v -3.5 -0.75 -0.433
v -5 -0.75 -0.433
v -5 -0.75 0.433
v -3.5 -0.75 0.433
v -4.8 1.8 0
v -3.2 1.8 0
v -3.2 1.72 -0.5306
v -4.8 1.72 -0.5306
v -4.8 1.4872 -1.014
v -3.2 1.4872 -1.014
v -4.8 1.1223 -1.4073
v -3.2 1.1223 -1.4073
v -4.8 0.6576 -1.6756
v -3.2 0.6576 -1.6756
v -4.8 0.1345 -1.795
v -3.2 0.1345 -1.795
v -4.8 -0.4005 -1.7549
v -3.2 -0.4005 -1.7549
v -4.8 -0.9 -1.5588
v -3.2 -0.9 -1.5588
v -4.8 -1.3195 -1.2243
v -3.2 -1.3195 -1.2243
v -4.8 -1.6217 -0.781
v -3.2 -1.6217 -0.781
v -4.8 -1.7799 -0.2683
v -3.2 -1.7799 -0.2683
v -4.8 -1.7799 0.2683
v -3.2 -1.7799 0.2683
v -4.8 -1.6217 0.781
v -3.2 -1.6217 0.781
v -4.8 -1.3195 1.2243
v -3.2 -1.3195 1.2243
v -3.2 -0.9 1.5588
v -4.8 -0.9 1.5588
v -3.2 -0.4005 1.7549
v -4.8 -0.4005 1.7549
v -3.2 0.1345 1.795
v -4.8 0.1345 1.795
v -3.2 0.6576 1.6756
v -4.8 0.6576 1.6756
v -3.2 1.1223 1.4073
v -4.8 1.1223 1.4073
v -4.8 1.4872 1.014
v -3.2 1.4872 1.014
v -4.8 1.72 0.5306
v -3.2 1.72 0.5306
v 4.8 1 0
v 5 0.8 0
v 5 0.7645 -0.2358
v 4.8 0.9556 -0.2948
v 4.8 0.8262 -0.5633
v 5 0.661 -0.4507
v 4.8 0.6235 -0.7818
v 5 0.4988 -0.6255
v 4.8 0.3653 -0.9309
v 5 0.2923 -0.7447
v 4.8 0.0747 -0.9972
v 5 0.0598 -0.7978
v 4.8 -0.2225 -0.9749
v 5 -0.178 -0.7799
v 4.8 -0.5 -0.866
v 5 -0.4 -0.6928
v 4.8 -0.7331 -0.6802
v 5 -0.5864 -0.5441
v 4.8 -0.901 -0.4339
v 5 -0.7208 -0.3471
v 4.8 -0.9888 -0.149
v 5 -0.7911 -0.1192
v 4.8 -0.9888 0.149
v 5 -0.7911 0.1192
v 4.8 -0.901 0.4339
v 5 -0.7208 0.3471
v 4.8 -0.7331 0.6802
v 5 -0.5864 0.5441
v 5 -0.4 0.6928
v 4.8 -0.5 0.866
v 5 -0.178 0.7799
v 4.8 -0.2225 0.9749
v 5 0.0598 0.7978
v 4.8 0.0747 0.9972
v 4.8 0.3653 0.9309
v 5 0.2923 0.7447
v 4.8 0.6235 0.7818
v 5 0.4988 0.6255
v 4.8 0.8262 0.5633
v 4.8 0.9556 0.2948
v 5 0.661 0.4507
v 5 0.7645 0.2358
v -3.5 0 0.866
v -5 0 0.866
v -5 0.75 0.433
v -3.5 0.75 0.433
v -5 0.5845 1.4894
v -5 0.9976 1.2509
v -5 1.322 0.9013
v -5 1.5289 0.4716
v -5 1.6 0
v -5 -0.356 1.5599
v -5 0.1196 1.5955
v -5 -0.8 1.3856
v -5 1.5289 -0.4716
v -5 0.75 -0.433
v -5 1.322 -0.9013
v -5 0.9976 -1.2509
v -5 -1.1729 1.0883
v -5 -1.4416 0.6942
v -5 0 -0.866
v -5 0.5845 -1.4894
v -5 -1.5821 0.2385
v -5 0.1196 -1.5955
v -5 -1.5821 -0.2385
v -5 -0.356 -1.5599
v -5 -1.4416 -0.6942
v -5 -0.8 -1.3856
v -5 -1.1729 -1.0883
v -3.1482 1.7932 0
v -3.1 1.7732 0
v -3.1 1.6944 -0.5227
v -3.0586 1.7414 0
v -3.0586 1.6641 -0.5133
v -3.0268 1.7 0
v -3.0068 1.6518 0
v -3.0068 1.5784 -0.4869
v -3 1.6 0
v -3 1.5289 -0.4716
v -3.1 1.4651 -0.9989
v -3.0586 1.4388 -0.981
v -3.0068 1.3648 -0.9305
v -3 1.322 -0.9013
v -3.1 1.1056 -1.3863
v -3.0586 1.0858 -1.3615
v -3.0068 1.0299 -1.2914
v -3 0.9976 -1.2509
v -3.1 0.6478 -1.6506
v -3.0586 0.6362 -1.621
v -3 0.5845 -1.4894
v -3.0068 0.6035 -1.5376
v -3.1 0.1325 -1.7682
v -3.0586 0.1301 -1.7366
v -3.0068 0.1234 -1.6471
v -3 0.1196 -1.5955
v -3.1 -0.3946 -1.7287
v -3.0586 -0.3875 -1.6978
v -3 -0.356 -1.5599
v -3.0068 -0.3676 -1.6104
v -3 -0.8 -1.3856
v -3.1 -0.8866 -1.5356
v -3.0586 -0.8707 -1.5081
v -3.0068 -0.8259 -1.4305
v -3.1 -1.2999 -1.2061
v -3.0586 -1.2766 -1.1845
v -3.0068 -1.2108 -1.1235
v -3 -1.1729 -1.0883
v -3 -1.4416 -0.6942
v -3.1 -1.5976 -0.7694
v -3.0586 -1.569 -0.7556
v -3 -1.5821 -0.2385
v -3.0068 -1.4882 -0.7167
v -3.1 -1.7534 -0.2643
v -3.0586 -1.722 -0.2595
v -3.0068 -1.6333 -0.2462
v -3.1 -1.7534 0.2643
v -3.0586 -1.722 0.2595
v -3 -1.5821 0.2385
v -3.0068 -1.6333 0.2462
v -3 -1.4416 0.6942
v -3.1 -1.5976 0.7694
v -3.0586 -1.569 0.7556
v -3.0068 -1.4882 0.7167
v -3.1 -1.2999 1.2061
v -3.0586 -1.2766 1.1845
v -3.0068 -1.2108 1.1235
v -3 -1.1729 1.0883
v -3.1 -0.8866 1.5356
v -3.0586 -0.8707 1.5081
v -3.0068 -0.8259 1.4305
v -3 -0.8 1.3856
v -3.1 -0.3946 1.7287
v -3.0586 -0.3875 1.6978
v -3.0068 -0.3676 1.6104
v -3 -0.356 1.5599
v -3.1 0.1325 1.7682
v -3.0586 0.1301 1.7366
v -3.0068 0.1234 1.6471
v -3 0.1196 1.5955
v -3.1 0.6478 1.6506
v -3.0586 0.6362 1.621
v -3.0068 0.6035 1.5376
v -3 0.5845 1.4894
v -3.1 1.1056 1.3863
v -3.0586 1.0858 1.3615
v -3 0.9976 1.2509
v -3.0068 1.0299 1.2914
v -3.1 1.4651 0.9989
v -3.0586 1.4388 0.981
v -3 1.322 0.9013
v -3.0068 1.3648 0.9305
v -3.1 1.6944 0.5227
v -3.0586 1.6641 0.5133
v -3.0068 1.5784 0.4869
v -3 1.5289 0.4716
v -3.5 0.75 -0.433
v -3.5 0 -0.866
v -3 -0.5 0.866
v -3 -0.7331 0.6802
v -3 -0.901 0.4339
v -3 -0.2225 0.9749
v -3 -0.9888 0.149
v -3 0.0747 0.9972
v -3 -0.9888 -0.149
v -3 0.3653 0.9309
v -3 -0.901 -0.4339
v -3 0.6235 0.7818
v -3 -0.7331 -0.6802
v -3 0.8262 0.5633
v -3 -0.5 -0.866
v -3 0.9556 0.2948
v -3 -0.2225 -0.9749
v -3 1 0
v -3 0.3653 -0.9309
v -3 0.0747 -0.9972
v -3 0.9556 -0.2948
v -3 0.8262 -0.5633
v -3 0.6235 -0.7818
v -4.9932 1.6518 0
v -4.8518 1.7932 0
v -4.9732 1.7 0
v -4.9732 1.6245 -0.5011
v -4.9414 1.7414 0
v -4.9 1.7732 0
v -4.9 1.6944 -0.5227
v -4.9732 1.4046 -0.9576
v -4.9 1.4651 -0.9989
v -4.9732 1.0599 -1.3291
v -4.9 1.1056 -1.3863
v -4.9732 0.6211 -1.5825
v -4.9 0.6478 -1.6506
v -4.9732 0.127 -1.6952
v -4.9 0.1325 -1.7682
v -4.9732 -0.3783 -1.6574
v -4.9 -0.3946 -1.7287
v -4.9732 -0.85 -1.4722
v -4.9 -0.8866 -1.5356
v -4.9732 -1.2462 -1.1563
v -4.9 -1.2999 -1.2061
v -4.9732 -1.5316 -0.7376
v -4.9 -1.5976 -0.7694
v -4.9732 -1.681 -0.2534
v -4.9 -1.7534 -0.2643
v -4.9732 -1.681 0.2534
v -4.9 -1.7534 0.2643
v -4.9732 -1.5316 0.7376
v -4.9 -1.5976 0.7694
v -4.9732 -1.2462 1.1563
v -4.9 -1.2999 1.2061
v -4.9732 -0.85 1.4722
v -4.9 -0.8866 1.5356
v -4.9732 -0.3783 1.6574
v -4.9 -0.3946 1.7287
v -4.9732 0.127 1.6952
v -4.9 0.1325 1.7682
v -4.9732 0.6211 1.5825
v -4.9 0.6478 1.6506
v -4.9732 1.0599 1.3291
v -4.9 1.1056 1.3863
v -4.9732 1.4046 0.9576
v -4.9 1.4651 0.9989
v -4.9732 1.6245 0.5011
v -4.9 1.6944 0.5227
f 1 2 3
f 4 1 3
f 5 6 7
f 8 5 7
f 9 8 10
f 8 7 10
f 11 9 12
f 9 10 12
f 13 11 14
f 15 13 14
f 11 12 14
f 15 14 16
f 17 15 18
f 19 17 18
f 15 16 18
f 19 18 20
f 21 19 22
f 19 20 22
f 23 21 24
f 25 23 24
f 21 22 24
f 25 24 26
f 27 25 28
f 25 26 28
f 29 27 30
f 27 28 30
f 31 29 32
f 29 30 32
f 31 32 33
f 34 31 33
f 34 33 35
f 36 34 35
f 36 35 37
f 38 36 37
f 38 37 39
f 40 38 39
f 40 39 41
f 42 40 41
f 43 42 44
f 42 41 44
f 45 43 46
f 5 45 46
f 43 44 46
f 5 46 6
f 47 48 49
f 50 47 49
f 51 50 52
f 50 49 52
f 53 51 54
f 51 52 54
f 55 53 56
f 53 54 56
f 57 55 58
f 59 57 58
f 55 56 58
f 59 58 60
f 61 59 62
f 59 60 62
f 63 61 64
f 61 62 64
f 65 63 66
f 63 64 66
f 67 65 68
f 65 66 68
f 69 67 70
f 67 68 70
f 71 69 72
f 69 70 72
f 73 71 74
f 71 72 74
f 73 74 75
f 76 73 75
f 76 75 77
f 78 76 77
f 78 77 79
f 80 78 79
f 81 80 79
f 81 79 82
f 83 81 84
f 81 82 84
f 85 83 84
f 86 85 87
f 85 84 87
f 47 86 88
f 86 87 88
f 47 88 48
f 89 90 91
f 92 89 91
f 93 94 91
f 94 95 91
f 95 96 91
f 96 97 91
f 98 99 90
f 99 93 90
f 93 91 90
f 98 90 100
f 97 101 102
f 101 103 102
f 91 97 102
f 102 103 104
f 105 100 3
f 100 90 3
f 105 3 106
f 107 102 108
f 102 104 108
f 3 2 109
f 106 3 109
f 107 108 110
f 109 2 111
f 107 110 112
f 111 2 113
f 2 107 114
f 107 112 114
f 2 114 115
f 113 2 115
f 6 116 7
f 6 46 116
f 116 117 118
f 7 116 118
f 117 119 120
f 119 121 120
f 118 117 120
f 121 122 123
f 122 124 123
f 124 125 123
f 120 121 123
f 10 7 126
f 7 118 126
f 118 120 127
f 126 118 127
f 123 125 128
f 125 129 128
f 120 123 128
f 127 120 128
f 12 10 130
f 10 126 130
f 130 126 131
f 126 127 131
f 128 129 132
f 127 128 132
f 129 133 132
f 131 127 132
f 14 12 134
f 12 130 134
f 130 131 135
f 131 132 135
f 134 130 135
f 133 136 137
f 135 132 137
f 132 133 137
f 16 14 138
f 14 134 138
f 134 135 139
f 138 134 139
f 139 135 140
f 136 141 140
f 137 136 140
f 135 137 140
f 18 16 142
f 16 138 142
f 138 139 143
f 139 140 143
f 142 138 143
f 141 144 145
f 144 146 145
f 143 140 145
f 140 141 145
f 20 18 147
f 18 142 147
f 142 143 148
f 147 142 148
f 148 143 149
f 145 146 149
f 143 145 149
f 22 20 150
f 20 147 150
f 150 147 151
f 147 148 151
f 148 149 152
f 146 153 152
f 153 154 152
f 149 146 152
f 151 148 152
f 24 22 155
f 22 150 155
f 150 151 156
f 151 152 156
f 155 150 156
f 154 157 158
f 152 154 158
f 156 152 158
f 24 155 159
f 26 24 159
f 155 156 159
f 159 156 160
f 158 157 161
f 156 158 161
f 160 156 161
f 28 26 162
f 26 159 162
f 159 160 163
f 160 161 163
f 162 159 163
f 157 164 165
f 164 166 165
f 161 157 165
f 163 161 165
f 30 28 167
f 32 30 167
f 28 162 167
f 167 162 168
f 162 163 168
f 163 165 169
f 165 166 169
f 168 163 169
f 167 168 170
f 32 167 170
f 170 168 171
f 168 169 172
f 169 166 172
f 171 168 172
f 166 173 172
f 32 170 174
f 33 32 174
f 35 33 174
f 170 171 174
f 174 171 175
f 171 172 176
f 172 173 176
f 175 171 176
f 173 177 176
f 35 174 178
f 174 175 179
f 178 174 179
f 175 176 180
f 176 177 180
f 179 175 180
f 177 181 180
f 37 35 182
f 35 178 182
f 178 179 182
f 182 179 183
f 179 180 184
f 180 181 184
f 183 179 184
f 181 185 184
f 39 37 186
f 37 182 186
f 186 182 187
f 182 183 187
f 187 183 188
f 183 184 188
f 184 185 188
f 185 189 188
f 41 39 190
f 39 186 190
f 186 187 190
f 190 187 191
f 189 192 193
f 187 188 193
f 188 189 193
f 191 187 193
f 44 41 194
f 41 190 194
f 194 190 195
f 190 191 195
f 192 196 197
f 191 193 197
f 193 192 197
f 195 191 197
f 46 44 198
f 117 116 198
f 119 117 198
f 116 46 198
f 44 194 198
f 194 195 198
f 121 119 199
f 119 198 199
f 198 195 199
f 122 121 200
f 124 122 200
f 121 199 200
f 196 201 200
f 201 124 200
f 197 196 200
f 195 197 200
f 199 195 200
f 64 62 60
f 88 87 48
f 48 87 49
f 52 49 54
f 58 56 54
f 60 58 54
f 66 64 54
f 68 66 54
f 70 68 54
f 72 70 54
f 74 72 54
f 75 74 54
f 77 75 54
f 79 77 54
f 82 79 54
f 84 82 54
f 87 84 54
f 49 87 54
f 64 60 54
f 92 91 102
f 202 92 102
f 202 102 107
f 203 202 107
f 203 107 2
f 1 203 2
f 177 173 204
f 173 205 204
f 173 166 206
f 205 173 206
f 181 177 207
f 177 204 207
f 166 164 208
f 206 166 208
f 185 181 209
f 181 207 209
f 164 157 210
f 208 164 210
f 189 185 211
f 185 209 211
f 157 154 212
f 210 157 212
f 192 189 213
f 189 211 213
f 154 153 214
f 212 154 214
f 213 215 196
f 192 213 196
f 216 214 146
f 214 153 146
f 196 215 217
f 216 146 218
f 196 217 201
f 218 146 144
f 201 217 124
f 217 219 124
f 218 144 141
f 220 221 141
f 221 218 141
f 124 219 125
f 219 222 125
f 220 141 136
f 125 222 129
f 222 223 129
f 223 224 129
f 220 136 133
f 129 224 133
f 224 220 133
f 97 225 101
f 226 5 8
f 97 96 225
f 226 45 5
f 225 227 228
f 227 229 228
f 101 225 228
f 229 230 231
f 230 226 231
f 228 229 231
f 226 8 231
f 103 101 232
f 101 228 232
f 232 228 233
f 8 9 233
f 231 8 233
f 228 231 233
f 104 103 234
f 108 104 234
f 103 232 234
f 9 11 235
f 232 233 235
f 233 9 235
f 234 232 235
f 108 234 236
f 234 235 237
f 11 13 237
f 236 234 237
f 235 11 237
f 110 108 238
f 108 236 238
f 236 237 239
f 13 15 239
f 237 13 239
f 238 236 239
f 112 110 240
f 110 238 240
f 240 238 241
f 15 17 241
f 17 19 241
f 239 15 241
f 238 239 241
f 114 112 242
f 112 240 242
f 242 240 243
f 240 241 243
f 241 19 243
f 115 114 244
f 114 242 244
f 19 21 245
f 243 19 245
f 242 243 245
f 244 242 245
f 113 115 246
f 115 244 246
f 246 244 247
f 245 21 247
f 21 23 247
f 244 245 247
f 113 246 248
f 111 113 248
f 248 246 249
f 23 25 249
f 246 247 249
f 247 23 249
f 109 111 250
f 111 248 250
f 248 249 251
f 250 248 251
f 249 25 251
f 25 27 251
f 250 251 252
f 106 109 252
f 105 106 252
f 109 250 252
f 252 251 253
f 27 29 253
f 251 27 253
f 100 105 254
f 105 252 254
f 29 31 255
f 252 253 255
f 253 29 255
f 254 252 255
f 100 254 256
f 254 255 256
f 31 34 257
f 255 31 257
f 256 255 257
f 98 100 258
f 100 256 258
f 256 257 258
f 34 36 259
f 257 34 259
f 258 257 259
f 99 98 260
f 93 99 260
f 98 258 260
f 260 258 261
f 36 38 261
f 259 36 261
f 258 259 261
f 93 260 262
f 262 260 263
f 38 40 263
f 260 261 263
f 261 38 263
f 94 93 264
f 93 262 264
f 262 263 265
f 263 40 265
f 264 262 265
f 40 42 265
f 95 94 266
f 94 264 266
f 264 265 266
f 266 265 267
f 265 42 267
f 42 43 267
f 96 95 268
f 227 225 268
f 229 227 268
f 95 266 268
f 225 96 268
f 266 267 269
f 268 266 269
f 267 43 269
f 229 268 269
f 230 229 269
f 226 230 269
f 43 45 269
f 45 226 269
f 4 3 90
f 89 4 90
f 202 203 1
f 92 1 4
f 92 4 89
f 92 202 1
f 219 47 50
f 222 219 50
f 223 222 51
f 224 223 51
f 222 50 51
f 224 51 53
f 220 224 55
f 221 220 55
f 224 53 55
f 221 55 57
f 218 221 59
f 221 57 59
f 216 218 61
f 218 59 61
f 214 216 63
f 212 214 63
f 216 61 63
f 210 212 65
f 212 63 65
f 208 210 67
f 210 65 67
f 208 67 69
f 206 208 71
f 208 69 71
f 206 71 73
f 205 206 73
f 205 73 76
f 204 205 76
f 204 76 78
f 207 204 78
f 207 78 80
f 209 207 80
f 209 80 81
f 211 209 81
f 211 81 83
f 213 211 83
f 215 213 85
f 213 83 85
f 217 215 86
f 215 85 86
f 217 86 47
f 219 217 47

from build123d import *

# Parameters (mm, degrees)
CUT_EXTRUDE_1_DEPTH = 1.5
FILLET_1_R          = 0.2
CHAMFER_1_SIZE      = 0.2


with BuildPart() as part:
    # 草图1 → 旋转1 (revolve)
    with BuildSketch(Plane.XY):
        Polygon((-5, 0), (-5, 1.8), (-3, 1.8), (-3, 1), (5, 1), (5, 0), align=None)
    revolve(axis=Axis((5, 0, 0), (-1, 0, 0)))

    # 草图2 → 切除-拉伸1 (cut)
    with BuildSketch(Plane.ZY.offset(5)):
        Polygon((0.866025404, 0), (0.433012702, 0.75), (-0.433012702, 0.75), (-0.866025404, 0), (-0.433012702, -0.75), (0.433012702, -0.75), align=None)
    extrude(amount=-CUT_EXTRUDE_1_DEPTH, mode=Mode.SUBTRACT)

    # 圆角1
    fillet_1_edges = [part.edges().sort_by_distance(p)[0] for p in [
        (-3, -1.8, 0),
        (-5, -1.8, 0),
    ]]
    fillet(fillet_1_edges, radius=FILLET_1_R)

    # 倒角1
    chamfer_1_edges = [part.edges().sort_by_distance(p)[0] for p in [
        (5, -1, 0),
    ]]
    chamfer(chamfer_1_edges, length=CHAMFER_1_SIZE)


solid = part.part
